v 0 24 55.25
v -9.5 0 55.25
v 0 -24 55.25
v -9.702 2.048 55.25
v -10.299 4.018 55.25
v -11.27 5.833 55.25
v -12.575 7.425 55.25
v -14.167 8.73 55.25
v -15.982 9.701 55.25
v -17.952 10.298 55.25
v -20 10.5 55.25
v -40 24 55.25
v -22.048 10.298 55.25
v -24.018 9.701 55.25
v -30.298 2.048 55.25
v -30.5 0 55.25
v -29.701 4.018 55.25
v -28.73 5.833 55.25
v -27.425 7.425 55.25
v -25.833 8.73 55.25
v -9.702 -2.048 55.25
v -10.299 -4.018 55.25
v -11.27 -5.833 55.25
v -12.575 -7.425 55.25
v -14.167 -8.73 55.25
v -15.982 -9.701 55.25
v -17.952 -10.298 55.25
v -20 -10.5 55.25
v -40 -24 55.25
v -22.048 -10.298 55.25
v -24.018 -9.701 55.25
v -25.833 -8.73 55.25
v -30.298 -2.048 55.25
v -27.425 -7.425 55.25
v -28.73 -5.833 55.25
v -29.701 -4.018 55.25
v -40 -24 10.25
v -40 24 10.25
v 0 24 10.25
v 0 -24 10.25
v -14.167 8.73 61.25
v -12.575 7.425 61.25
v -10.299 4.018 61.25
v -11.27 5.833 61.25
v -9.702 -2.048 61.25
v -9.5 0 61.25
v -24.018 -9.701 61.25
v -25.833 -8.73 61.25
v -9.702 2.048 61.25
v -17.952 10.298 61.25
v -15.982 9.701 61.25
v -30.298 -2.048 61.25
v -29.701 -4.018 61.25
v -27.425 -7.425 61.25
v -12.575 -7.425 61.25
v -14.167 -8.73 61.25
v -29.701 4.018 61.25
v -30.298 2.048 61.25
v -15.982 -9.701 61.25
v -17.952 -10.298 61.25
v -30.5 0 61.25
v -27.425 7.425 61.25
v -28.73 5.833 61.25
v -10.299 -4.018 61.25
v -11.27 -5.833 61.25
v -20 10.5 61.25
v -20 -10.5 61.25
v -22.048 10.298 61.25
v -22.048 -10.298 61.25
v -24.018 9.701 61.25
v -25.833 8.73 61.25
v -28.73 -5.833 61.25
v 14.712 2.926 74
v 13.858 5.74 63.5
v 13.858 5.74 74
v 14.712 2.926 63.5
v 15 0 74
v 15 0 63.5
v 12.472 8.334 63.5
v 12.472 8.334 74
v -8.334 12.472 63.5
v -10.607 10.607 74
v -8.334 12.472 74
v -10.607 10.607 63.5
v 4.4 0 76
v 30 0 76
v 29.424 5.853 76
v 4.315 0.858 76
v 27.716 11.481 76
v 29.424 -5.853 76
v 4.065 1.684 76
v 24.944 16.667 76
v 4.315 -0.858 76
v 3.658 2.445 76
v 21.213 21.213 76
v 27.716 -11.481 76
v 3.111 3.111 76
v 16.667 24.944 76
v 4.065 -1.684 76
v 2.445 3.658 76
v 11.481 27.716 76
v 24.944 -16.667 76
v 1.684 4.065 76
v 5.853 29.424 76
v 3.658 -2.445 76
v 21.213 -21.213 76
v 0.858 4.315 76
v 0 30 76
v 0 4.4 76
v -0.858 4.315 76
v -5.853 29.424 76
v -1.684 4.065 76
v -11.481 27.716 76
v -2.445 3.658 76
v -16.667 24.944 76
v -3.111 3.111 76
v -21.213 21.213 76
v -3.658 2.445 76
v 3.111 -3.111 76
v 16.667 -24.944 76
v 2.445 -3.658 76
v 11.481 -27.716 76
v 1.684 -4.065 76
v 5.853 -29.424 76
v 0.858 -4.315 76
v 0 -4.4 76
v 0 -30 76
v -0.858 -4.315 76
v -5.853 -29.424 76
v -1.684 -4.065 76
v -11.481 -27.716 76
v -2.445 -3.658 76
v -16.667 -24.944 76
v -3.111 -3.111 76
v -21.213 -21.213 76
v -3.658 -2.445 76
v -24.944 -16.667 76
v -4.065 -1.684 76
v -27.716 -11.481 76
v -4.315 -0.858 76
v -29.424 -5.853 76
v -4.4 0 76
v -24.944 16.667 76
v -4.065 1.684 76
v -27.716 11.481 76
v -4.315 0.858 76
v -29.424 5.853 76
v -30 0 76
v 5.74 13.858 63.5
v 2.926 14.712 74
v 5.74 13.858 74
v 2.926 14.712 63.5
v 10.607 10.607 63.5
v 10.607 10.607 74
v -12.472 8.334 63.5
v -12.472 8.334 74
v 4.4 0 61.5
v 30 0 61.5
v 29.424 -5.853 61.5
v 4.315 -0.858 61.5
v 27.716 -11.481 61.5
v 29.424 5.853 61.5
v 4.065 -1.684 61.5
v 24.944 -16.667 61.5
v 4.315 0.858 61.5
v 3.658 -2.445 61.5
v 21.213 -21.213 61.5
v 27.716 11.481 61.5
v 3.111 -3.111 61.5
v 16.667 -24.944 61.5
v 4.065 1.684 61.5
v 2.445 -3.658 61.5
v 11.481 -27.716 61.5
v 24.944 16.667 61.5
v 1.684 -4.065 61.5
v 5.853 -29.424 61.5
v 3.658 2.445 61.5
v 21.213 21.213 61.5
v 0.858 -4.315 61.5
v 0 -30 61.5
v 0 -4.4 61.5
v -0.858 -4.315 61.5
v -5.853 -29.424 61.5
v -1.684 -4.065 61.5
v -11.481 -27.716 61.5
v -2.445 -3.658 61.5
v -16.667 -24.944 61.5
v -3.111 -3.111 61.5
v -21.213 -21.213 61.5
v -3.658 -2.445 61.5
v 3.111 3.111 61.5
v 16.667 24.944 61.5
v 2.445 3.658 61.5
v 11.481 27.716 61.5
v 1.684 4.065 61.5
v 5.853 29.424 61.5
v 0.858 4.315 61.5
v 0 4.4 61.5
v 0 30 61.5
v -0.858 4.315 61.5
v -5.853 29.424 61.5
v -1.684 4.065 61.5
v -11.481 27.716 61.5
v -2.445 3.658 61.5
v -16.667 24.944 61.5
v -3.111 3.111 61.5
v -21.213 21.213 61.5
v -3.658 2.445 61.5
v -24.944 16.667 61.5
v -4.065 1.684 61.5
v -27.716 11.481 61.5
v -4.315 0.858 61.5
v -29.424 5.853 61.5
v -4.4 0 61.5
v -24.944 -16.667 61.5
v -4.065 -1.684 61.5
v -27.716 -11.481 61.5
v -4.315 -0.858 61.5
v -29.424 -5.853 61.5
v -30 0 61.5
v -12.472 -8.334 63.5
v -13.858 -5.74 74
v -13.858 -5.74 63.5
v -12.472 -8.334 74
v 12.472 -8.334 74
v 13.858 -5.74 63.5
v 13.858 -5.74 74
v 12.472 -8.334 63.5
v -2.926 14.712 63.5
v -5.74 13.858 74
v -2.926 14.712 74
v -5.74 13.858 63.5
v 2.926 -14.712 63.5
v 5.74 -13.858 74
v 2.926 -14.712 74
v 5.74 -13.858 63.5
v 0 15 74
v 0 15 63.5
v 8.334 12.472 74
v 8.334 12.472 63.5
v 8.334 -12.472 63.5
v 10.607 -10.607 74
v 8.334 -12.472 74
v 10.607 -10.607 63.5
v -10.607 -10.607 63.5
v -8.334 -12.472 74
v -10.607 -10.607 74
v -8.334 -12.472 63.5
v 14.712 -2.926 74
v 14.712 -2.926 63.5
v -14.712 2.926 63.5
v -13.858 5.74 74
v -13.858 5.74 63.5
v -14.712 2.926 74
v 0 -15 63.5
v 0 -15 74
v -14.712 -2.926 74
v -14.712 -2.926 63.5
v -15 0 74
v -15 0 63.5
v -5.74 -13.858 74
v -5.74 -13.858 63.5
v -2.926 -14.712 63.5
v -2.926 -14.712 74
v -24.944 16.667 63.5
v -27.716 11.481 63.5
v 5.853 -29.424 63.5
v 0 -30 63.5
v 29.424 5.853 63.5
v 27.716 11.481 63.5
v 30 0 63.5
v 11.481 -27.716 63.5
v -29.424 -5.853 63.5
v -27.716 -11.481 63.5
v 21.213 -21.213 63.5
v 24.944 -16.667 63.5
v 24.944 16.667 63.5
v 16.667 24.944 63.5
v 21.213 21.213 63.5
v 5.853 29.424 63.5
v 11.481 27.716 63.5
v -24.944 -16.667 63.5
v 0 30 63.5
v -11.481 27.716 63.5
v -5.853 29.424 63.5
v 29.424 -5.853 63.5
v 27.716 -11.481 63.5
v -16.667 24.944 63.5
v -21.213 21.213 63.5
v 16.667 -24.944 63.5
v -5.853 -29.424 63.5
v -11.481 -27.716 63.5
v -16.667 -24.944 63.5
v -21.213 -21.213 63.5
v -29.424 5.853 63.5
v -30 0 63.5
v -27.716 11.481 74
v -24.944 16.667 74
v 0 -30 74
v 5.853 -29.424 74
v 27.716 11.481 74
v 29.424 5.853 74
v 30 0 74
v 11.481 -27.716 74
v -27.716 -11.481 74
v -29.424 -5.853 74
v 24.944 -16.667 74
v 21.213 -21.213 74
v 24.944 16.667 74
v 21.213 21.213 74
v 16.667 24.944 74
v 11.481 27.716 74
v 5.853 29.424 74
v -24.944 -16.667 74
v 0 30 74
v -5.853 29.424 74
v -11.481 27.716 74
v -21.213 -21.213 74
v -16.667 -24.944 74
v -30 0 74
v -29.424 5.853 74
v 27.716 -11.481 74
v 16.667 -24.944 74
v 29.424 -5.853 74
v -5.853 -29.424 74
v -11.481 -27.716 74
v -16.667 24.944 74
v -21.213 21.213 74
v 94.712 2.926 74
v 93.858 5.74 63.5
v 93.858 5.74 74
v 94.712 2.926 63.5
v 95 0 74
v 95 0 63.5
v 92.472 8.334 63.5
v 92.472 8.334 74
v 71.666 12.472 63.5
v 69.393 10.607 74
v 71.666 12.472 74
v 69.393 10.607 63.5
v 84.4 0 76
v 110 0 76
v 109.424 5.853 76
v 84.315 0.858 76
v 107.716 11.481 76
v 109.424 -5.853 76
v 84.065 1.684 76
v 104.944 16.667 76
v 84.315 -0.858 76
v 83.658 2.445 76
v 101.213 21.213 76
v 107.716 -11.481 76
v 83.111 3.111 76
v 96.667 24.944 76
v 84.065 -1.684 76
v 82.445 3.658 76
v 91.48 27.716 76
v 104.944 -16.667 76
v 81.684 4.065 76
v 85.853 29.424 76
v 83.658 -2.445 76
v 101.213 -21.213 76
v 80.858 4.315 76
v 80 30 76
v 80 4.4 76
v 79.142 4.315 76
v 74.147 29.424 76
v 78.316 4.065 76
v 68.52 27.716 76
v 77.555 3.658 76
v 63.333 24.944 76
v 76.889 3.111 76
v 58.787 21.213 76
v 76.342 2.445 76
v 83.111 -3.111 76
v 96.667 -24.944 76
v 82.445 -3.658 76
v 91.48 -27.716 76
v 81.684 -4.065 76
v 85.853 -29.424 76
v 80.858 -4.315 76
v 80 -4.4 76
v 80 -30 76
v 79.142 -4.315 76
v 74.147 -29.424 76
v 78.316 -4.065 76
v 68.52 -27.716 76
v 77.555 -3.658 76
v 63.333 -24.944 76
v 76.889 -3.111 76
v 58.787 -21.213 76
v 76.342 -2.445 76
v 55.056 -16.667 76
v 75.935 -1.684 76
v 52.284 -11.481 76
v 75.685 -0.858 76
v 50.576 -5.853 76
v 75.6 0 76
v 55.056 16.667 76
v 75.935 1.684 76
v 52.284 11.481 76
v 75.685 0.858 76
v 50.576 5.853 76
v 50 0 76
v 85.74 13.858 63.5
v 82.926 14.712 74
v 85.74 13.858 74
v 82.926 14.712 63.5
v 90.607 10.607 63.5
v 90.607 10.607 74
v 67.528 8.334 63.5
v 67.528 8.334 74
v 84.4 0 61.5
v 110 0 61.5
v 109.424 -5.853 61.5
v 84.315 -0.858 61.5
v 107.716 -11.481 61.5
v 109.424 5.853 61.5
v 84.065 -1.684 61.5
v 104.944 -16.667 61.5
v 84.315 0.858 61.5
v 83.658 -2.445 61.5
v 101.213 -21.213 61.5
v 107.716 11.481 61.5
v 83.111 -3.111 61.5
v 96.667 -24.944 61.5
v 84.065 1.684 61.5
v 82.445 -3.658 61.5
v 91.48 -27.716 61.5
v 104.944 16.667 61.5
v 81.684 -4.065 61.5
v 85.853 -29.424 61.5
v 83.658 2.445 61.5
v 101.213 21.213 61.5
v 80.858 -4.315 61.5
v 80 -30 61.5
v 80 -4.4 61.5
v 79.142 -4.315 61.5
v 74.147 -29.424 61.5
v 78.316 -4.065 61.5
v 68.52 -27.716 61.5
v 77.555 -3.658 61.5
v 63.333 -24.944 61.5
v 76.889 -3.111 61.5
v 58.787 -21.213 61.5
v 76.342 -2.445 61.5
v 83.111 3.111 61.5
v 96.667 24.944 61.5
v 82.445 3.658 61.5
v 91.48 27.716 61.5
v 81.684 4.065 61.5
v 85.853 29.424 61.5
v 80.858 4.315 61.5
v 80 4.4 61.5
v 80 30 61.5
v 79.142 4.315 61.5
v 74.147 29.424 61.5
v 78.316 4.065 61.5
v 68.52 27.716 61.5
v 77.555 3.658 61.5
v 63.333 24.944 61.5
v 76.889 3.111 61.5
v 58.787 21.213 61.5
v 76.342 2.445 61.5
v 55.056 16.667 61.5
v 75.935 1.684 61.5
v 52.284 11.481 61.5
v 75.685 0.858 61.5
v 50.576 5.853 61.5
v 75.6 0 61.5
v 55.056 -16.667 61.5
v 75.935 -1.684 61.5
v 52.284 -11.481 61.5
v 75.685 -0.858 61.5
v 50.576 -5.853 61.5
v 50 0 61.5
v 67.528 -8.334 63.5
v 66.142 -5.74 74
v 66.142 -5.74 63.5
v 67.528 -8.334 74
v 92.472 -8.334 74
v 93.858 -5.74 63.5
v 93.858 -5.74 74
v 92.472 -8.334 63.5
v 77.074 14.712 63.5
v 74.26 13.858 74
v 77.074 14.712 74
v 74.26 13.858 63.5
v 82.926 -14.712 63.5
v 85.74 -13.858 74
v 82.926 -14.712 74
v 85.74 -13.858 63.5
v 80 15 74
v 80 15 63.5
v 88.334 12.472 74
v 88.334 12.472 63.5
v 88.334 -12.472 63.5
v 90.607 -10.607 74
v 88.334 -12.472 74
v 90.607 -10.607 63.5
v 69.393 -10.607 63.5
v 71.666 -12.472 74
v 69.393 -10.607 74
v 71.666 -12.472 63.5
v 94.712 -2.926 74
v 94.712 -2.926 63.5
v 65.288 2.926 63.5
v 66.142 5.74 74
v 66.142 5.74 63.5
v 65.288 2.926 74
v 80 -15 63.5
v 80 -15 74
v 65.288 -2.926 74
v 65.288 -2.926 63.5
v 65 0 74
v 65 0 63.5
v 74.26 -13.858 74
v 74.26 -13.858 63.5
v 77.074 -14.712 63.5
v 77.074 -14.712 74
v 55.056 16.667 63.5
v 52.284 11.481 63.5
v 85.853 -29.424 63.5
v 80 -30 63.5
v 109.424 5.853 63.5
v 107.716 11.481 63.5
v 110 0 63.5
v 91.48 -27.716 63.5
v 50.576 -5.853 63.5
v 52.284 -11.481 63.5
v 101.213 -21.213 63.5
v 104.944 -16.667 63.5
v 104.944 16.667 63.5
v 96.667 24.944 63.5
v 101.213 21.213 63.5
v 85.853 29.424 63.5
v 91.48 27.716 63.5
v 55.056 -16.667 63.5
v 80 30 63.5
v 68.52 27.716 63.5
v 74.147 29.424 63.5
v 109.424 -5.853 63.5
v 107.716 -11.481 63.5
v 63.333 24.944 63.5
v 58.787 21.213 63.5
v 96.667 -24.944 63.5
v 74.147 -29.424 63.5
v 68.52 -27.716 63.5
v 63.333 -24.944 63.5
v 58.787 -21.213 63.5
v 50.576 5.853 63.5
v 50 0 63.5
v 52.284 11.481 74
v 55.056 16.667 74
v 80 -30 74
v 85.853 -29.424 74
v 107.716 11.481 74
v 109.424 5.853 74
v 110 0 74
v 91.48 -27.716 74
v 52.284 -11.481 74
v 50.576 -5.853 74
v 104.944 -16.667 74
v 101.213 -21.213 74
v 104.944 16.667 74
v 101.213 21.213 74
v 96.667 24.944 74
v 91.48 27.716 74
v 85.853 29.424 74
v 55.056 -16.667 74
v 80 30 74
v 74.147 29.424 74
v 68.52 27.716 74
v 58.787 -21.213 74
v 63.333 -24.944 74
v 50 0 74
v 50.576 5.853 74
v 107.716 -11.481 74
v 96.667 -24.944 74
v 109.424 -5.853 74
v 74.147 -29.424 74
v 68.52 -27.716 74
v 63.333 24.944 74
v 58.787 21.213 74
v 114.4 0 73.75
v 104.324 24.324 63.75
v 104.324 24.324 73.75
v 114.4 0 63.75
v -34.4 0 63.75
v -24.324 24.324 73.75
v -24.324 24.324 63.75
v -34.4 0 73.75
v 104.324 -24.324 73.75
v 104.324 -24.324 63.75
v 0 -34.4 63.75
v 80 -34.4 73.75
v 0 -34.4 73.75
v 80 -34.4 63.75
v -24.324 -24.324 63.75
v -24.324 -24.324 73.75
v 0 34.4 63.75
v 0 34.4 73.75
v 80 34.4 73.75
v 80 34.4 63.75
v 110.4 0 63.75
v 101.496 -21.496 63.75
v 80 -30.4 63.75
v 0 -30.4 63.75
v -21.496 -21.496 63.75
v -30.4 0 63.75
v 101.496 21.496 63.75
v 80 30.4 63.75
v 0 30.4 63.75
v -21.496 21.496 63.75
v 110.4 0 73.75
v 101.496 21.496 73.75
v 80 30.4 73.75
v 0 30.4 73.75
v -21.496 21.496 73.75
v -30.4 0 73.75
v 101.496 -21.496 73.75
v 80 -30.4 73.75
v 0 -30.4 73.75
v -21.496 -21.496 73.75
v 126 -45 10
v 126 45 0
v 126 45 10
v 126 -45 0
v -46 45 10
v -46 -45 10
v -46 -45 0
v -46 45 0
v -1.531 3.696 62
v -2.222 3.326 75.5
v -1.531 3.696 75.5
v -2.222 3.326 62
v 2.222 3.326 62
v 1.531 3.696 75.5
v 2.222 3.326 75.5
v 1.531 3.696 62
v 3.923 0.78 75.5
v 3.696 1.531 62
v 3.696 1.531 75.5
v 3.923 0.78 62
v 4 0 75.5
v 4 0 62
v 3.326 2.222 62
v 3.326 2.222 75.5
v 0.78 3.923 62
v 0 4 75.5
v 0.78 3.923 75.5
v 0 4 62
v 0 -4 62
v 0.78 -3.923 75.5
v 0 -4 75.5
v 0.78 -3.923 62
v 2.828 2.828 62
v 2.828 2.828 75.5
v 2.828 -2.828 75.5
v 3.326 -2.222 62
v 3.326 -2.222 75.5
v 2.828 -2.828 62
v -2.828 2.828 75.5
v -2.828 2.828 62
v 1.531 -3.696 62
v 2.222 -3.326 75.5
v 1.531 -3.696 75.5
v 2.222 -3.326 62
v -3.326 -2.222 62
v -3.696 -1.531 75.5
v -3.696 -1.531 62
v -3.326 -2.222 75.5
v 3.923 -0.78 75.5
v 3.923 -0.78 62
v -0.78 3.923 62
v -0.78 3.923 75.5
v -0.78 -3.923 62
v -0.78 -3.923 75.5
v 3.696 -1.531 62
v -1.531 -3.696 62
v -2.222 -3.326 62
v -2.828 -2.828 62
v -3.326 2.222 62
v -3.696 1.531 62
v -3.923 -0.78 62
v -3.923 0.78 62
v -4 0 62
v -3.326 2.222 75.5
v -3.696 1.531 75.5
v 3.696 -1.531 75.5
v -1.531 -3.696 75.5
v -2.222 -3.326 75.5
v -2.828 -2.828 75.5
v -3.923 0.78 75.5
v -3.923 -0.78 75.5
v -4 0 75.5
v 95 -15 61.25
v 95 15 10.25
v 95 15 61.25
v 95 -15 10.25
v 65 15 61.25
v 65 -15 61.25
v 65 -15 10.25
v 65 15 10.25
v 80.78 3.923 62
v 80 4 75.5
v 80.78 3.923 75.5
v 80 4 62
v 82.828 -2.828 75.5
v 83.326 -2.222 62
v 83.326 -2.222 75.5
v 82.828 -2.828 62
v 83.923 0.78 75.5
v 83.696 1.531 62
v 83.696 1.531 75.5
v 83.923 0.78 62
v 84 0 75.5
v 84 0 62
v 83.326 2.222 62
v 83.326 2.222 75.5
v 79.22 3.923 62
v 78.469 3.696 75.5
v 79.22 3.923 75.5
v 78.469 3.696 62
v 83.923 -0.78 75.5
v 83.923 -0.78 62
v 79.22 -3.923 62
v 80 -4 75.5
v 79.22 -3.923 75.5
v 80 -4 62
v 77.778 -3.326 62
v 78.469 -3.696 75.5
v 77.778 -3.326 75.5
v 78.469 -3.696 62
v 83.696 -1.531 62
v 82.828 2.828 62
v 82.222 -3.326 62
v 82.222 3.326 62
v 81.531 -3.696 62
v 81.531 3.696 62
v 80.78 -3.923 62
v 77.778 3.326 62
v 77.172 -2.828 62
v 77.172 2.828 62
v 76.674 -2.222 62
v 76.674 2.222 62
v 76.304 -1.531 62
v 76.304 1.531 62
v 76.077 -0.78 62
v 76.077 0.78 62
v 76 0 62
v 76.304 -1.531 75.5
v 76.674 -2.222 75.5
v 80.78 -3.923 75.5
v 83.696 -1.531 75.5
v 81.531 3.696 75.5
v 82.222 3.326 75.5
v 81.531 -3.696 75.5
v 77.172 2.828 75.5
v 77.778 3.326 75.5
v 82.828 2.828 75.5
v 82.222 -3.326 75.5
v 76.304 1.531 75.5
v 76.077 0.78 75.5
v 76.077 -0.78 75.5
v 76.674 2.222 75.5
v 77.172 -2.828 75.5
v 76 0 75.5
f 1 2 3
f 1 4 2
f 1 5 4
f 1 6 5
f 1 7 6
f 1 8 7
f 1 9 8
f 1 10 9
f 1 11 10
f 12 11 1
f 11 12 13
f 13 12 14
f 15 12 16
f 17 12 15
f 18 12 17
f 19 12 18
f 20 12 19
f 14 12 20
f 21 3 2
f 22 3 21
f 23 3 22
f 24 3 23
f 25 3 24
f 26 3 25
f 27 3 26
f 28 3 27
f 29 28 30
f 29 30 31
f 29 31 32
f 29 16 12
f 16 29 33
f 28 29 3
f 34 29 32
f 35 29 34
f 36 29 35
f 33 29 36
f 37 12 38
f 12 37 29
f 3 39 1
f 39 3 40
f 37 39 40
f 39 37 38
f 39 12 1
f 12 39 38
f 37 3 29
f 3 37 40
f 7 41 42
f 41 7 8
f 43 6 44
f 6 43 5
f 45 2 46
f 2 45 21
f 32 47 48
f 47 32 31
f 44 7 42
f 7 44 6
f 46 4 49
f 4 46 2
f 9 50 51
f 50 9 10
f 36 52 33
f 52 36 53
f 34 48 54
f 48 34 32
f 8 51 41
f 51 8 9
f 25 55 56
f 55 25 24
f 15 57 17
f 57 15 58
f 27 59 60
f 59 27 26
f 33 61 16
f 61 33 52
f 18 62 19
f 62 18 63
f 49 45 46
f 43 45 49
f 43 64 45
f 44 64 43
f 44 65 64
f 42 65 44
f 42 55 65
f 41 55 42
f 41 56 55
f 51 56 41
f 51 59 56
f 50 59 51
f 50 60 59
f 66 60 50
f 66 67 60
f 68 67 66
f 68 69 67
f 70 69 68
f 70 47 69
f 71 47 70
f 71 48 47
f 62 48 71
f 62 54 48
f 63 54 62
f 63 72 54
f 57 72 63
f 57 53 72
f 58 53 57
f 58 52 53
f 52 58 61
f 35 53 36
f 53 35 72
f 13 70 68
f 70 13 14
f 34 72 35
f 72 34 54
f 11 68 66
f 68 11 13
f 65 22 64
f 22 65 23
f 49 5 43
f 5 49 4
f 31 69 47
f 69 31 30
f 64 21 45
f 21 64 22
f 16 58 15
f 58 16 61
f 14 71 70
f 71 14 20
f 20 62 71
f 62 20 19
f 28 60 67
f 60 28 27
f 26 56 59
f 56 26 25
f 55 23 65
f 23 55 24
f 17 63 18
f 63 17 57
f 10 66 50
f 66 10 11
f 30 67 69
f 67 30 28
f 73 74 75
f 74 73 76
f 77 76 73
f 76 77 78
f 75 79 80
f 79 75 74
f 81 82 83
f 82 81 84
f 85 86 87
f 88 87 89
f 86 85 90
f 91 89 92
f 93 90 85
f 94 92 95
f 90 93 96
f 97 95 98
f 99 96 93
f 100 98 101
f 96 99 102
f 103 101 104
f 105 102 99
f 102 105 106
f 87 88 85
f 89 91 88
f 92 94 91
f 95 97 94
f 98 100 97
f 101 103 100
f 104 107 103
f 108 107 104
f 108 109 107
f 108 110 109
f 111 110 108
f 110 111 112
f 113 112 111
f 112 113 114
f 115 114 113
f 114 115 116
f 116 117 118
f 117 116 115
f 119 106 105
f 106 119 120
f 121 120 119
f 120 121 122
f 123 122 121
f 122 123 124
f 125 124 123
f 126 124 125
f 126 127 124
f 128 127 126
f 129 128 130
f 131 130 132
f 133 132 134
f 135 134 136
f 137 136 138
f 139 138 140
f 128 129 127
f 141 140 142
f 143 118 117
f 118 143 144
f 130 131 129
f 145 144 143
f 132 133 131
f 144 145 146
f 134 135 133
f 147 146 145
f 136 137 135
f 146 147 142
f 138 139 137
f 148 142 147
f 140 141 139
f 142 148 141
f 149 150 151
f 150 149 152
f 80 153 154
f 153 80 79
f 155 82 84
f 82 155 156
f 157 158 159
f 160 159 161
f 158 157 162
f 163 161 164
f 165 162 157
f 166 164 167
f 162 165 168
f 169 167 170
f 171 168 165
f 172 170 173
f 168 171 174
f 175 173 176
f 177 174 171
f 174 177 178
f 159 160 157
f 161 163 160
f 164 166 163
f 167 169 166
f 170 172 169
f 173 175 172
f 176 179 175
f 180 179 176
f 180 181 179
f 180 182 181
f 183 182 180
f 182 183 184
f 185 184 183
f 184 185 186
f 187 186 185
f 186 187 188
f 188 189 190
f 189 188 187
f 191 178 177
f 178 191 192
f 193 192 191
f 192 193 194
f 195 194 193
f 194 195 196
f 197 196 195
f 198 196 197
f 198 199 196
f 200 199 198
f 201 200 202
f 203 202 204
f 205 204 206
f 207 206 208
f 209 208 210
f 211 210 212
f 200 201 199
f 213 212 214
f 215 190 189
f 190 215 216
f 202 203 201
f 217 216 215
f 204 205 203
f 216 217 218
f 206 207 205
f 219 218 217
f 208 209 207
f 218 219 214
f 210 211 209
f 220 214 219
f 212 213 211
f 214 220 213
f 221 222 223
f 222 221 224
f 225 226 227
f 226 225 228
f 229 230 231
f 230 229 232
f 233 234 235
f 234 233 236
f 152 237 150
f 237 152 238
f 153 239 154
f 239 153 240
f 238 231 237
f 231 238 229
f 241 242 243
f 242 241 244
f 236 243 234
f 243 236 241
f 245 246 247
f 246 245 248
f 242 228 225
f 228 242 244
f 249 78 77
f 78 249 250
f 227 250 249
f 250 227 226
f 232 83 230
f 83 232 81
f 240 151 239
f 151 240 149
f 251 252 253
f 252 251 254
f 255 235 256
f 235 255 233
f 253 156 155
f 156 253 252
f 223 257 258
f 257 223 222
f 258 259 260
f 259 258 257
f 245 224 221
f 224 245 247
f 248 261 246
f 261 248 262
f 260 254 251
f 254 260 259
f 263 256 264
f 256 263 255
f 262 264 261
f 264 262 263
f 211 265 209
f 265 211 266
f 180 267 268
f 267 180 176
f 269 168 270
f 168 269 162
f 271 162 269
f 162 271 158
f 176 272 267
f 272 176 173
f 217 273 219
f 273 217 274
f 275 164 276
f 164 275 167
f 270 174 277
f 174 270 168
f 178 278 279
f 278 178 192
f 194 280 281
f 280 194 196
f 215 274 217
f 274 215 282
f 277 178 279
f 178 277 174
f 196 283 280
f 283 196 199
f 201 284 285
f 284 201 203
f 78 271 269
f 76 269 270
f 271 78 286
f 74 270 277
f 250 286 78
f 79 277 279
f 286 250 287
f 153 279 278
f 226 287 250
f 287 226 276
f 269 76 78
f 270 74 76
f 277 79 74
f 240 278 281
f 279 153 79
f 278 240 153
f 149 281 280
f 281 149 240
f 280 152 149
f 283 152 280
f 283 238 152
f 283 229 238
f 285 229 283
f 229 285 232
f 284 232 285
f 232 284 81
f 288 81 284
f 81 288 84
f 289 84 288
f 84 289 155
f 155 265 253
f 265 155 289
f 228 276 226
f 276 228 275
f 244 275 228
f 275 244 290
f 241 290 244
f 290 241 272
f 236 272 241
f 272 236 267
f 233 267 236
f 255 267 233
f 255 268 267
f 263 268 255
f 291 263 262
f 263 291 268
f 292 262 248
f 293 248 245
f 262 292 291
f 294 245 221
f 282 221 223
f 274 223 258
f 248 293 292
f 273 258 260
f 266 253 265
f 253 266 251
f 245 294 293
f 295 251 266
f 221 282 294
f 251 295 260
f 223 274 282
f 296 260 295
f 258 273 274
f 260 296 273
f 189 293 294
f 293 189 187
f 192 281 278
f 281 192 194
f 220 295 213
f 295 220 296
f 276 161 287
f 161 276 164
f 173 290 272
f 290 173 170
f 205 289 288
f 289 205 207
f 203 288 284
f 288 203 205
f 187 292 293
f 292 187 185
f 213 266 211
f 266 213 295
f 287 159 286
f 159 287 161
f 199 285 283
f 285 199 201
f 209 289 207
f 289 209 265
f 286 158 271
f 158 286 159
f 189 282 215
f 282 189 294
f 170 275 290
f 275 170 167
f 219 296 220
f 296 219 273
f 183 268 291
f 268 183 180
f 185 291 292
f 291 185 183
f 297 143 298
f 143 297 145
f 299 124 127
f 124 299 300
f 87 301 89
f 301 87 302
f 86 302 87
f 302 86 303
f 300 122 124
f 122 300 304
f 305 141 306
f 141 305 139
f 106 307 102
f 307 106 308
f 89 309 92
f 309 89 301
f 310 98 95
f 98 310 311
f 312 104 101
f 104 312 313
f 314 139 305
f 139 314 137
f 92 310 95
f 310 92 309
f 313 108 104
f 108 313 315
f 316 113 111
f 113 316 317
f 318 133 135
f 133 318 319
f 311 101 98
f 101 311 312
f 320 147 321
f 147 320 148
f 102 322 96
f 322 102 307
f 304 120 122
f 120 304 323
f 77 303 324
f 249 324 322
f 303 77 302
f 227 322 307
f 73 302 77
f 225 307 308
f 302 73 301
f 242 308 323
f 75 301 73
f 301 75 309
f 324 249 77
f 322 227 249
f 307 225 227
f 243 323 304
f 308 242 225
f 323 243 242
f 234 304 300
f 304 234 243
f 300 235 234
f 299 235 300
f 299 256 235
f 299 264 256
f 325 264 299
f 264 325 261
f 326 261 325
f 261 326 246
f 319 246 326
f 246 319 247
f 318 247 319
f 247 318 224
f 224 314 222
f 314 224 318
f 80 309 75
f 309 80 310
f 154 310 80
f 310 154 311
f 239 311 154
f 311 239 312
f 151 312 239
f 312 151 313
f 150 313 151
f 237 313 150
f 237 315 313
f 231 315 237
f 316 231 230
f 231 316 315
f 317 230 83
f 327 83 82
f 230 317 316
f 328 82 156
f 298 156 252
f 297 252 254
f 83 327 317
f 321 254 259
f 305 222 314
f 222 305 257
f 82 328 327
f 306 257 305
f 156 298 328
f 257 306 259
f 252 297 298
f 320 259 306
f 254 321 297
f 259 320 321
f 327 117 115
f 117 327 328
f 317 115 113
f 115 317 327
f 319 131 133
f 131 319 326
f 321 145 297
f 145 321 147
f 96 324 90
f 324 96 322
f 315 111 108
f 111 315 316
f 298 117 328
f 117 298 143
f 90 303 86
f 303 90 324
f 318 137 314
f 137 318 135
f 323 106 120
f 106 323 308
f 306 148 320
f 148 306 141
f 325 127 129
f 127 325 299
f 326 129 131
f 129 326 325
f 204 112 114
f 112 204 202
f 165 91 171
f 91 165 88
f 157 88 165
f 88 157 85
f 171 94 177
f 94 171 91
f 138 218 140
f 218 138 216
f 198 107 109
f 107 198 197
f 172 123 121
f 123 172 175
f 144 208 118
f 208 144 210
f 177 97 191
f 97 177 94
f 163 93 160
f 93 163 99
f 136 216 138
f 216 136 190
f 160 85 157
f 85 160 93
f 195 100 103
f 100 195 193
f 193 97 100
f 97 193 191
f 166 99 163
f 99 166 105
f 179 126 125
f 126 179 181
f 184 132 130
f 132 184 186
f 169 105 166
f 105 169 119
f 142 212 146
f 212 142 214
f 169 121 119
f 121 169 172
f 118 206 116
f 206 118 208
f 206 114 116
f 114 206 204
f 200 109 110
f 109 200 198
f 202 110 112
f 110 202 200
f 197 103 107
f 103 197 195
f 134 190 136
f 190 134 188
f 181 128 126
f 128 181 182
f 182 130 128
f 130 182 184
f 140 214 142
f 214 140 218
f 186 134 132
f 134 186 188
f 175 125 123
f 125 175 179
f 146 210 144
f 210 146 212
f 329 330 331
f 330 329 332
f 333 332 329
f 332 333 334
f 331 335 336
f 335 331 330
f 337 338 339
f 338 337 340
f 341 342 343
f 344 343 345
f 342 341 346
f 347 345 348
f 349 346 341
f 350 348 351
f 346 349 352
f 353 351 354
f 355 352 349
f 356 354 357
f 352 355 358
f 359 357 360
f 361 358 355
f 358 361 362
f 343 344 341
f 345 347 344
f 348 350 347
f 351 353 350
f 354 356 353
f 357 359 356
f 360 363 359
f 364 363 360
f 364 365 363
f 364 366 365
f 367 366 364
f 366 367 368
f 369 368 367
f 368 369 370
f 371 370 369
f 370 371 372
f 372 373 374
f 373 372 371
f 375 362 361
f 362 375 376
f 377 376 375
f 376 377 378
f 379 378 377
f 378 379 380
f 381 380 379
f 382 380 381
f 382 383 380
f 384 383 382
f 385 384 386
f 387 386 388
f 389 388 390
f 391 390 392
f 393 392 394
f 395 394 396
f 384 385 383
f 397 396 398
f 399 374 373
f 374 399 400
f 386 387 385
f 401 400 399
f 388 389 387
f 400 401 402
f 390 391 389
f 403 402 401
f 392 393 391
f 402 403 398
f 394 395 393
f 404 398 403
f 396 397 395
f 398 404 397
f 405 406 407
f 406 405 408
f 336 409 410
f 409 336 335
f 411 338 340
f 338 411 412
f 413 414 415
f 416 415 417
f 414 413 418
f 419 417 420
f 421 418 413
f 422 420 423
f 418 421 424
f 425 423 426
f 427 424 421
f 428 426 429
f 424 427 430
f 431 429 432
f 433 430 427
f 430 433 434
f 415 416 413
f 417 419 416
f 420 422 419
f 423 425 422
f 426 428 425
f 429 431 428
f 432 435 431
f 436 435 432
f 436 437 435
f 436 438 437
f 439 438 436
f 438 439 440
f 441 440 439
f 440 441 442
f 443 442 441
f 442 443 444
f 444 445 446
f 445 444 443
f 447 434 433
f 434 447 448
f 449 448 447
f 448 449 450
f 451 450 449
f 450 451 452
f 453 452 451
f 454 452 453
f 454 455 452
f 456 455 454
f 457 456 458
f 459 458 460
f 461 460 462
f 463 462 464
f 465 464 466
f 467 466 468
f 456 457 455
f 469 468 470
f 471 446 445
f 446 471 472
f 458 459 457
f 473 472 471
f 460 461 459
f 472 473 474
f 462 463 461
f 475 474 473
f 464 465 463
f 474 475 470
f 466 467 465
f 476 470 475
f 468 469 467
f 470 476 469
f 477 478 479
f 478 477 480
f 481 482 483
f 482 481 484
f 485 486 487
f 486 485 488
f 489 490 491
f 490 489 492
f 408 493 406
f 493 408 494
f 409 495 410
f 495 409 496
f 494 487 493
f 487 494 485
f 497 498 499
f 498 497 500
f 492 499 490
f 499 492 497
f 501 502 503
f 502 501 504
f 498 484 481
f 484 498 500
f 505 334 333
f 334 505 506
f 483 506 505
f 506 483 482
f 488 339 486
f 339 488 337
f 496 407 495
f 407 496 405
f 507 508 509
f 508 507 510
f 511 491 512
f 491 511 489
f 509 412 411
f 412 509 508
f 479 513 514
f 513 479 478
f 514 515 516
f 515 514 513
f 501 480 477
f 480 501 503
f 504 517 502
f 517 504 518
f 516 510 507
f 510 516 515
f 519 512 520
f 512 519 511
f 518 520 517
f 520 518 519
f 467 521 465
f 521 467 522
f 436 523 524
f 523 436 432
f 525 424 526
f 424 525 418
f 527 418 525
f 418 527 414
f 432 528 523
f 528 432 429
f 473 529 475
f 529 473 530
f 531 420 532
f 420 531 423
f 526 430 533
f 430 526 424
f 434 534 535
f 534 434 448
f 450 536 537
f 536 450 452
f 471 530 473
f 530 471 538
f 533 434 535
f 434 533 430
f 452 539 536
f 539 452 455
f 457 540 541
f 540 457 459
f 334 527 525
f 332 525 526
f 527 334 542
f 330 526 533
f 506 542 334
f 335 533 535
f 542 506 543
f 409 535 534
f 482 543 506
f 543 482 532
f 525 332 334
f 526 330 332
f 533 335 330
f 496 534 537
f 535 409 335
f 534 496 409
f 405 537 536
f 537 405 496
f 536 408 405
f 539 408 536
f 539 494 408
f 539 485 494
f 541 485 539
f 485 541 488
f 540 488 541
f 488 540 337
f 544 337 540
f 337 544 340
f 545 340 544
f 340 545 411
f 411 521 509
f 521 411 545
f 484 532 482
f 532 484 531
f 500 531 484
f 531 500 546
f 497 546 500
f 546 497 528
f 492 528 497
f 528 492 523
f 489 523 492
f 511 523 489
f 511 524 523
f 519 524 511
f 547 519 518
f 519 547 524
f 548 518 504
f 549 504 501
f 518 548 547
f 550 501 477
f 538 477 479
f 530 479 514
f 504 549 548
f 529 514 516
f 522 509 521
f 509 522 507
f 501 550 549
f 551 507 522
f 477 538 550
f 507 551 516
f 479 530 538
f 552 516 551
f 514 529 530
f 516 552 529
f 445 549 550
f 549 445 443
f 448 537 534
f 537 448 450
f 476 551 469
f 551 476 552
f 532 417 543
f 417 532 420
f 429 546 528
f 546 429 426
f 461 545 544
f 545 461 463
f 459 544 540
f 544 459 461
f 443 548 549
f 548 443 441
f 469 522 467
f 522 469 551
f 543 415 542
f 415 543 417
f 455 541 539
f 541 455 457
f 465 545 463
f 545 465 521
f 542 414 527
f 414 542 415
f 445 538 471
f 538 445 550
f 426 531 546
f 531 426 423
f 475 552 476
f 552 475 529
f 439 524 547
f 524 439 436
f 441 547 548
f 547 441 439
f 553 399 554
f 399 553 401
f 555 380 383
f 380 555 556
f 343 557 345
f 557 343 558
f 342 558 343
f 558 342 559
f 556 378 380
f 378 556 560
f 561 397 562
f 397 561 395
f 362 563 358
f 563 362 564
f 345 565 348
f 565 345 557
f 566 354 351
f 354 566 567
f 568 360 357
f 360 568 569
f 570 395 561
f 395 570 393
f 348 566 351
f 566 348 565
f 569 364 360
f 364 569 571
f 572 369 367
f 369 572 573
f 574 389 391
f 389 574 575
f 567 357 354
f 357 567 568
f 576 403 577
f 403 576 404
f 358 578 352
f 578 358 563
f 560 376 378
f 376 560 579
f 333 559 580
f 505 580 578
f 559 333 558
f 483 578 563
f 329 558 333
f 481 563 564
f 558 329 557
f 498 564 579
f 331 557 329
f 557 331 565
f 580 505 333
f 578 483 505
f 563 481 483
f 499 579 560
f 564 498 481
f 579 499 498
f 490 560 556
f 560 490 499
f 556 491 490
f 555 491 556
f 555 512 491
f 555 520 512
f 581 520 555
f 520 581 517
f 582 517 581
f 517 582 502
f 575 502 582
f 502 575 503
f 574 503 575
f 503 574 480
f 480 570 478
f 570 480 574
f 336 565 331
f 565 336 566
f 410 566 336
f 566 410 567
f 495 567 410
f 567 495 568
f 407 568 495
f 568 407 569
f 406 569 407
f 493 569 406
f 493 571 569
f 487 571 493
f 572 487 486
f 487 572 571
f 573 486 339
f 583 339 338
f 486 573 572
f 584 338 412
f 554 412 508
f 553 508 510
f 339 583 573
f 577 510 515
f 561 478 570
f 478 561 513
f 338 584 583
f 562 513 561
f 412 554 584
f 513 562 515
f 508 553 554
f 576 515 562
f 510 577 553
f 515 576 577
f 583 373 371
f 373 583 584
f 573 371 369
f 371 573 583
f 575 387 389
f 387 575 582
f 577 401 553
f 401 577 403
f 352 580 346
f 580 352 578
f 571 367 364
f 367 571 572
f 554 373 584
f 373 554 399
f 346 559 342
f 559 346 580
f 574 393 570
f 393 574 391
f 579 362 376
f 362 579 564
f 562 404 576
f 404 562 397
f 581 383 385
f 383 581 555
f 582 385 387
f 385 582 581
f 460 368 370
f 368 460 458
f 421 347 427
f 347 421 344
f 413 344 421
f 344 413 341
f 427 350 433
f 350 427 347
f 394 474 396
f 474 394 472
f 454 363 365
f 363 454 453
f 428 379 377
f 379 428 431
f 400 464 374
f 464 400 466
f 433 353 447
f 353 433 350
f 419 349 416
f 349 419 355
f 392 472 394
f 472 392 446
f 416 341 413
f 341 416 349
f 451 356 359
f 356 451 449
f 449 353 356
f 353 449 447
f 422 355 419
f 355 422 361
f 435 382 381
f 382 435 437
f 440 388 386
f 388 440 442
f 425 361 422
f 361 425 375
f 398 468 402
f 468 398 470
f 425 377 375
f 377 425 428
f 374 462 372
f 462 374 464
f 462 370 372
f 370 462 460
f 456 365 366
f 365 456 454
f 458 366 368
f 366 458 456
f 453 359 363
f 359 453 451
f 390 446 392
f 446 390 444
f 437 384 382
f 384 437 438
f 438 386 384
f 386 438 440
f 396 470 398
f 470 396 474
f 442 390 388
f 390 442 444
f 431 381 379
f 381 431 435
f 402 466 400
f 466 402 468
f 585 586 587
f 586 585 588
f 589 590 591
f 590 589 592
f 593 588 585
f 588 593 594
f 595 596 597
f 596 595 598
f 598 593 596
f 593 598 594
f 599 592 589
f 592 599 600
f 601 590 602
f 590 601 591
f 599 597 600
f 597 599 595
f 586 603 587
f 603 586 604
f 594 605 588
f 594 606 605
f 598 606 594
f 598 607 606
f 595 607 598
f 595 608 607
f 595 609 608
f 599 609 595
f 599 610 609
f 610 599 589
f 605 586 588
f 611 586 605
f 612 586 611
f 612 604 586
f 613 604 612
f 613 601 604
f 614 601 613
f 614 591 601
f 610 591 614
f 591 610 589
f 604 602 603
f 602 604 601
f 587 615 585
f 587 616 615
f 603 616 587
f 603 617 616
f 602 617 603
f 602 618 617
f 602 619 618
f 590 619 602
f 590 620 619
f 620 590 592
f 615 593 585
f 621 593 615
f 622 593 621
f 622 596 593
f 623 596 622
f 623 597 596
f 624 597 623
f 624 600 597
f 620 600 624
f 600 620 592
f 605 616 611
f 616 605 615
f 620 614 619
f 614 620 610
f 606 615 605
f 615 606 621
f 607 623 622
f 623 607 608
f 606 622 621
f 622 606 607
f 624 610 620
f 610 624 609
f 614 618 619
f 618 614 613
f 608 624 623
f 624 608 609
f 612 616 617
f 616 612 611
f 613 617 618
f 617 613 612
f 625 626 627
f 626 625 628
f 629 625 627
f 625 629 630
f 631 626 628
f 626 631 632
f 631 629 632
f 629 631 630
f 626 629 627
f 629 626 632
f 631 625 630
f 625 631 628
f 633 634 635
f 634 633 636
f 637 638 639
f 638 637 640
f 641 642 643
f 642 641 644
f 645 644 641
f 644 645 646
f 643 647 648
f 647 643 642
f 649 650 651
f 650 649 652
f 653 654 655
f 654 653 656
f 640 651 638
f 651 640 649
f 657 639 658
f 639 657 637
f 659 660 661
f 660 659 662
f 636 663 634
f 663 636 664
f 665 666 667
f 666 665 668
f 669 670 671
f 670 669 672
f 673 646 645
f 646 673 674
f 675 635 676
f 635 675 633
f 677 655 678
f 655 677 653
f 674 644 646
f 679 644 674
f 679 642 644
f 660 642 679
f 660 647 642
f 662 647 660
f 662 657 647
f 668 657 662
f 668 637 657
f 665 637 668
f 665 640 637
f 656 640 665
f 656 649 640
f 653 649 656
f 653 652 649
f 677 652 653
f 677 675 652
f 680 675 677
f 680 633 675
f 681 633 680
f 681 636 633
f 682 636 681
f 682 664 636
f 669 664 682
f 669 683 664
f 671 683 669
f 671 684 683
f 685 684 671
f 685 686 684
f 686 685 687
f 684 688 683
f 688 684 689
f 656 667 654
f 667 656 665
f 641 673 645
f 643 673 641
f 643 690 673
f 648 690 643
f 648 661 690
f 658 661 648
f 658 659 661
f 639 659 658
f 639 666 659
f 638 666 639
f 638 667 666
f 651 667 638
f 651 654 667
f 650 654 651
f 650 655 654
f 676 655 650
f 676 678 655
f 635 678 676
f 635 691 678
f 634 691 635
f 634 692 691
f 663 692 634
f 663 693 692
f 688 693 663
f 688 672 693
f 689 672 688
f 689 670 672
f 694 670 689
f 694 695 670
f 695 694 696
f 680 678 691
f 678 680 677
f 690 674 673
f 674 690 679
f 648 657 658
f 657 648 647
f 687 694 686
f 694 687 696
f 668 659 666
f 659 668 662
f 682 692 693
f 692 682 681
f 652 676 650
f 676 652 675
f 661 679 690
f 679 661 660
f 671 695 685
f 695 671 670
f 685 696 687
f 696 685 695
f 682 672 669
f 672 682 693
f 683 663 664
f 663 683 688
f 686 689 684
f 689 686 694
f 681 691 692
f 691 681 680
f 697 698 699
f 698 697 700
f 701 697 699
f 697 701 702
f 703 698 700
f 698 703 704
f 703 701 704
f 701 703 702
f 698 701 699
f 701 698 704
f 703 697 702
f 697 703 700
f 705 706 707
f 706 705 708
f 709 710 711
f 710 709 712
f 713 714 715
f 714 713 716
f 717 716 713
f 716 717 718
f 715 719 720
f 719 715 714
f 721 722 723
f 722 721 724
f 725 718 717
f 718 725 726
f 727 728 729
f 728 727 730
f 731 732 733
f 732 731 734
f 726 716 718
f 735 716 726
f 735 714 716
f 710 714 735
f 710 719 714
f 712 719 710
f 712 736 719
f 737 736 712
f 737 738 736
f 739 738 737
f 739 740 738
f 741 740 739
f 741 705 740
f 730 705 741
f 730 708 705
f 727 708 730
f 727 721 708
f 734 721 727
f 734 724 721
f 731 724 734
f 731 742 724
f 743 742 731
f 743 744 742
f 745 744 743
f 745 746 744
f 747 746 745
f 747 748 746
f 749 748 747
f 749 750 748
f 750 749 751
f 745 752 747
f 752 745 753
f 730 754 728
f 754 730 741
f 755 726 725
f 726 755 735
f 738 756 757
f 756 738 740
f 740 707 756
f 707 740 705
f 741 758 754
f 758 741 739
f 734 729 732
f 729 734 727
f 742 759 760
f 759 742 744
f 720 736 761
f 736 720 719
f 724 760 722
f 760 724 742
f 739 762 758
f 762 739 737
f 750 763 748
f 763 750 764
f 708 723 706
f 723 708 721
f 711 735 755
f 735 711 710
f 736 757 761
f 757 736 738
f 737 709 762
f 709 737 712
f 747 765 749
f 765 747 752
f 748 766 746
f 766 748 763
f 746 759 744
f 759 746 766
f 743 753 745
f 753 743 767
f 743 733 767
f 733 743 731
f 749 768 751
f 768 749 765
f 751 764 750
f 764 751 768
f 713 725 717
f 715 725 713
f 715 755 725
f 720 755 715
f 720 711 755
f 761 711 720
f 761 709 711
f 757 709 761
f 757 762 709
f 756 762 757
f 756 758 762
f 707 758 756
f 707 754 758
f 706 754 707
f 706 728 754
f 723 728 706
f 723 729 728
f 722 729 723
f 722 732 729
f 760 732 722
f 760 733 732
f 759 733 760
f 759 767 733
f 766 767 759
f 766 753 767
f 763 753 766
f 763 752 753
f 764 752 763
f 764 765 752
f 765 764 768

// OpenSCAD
$fn = 32;

// ------------------------------------------------------------------------
// Motor belt drive: span 80 mm, pulleys d60, belt 10 mm wide
// Every part is its own module, assembly() places every instance.
// ------------------------------------------------------------------------

// --- part 1 ---
module base_plate() {
  difference() {
    translate([-86, -45, 0]) cube([172, 90, 10]);
  }
}

// --- part 2 ---
module motor() {
  union() {
    translate([-22.5, -24, 0]) cube([45, 48, 40]);
    translate([25.5, 0, 20]) rotate([0, 90, 0]) cylinder(h = 6, d = 21, center = true);
  }
}

// --- part 3 ---
module drive_shaft() {
  translate([0, 0, -6.75]) cylinder(h = 13.5, d = 8);
}

// --- part 4 ---
module pulley_drive() {
  difference() {
    union() {
      cylinder(h = 14.5, d = 30);
      cylinder(h = 2, d = 60);
      translate([0, 0, 12.5]) cylinder(h = 2, d = 60);
    }
    translate([0, 0, -1]) cylinder(h = 16.5, d = 8.8);
  }
}

// --- part 5 ---
module idler_post() {
  translate([-15, -15, 0]) cube([30, 30, 51]);
}

// --- part 6 ---
module driven_shaft() {
  translate([0, 0, -6.75]) cylinder(h = 13.5, d = 8);
}

// --- part 7 ---
module pulley_driven() {
  difference() {
    union() {
      cylinder(h = 14.5, d = 30);
      cylinder(h = 2, d = 60);
      translate([0, 0, 12.5]) cylinder(h = 2, d = 60);
    }
    translate([0, 0, -1]) cylinder(h = 16.5, d = 8.8);
  }
}

// --- part 8 ---
module drive_belt() {
  difference() {
    linear_extrude(height = 10) polygon(points = concat([for (a = [90 : 45 : 270]) [34.4 * cos(a), 34.4 * sin(a)]], [for (a = [270 : 45 : 450]) [80 + 34.4 * cos(a), 34.4 * sin(a)]]));
    translate([0, 0, -1]) linear_extrude(height = 12) polygon(points = concat([for (a = [90 : 45 : 270]) [30.4 * cos(a), 30.4 * sin(a)]], [for (a = [270 : 45 : 450]) [80 + 30.4 * cos(a), 30.4 * sin(a)]]));
  }
}

// --- assembly ---
module assembly() {
  color([0.80, 0.24, 0.20]) translate([40, 0, 0]) rotate([0, 0, 0]) base_plate();
  color([0.20, 0.45, 0.75]) translate([0, 0, 32.75]) rotate([0, 270, 0]) motor();
  color([0.25, 0.62, 0.32]) translate([0, 0, 68.75]) rotate([0, 0, 0]) drive_shaft();
  color([0.92, 0.70, 0.18]) translate([0, 0, 61.5]) rotate([0, 0, 0]) pulley_drive();
  color([0.58, 0.35, 0.70]) translate([80, 0, 10.25]) rotate([0, 0, 0]) idler_post();
  color([0.16, 0.66, 0.66]) translate([80, 0, 68.75]) rotate([0, 0, 0]) driven_shaft();
  color([0.85, 0.48, 0.18]) translate([80, 0, 61.5]) rotate([0, 0, 0]) pulley_driven();
  color([0.55, 0.60, 0.65]) translate([0, 0, 63.75]) rotate([0, 0, 0]) drive_belt();
}

assembly();
